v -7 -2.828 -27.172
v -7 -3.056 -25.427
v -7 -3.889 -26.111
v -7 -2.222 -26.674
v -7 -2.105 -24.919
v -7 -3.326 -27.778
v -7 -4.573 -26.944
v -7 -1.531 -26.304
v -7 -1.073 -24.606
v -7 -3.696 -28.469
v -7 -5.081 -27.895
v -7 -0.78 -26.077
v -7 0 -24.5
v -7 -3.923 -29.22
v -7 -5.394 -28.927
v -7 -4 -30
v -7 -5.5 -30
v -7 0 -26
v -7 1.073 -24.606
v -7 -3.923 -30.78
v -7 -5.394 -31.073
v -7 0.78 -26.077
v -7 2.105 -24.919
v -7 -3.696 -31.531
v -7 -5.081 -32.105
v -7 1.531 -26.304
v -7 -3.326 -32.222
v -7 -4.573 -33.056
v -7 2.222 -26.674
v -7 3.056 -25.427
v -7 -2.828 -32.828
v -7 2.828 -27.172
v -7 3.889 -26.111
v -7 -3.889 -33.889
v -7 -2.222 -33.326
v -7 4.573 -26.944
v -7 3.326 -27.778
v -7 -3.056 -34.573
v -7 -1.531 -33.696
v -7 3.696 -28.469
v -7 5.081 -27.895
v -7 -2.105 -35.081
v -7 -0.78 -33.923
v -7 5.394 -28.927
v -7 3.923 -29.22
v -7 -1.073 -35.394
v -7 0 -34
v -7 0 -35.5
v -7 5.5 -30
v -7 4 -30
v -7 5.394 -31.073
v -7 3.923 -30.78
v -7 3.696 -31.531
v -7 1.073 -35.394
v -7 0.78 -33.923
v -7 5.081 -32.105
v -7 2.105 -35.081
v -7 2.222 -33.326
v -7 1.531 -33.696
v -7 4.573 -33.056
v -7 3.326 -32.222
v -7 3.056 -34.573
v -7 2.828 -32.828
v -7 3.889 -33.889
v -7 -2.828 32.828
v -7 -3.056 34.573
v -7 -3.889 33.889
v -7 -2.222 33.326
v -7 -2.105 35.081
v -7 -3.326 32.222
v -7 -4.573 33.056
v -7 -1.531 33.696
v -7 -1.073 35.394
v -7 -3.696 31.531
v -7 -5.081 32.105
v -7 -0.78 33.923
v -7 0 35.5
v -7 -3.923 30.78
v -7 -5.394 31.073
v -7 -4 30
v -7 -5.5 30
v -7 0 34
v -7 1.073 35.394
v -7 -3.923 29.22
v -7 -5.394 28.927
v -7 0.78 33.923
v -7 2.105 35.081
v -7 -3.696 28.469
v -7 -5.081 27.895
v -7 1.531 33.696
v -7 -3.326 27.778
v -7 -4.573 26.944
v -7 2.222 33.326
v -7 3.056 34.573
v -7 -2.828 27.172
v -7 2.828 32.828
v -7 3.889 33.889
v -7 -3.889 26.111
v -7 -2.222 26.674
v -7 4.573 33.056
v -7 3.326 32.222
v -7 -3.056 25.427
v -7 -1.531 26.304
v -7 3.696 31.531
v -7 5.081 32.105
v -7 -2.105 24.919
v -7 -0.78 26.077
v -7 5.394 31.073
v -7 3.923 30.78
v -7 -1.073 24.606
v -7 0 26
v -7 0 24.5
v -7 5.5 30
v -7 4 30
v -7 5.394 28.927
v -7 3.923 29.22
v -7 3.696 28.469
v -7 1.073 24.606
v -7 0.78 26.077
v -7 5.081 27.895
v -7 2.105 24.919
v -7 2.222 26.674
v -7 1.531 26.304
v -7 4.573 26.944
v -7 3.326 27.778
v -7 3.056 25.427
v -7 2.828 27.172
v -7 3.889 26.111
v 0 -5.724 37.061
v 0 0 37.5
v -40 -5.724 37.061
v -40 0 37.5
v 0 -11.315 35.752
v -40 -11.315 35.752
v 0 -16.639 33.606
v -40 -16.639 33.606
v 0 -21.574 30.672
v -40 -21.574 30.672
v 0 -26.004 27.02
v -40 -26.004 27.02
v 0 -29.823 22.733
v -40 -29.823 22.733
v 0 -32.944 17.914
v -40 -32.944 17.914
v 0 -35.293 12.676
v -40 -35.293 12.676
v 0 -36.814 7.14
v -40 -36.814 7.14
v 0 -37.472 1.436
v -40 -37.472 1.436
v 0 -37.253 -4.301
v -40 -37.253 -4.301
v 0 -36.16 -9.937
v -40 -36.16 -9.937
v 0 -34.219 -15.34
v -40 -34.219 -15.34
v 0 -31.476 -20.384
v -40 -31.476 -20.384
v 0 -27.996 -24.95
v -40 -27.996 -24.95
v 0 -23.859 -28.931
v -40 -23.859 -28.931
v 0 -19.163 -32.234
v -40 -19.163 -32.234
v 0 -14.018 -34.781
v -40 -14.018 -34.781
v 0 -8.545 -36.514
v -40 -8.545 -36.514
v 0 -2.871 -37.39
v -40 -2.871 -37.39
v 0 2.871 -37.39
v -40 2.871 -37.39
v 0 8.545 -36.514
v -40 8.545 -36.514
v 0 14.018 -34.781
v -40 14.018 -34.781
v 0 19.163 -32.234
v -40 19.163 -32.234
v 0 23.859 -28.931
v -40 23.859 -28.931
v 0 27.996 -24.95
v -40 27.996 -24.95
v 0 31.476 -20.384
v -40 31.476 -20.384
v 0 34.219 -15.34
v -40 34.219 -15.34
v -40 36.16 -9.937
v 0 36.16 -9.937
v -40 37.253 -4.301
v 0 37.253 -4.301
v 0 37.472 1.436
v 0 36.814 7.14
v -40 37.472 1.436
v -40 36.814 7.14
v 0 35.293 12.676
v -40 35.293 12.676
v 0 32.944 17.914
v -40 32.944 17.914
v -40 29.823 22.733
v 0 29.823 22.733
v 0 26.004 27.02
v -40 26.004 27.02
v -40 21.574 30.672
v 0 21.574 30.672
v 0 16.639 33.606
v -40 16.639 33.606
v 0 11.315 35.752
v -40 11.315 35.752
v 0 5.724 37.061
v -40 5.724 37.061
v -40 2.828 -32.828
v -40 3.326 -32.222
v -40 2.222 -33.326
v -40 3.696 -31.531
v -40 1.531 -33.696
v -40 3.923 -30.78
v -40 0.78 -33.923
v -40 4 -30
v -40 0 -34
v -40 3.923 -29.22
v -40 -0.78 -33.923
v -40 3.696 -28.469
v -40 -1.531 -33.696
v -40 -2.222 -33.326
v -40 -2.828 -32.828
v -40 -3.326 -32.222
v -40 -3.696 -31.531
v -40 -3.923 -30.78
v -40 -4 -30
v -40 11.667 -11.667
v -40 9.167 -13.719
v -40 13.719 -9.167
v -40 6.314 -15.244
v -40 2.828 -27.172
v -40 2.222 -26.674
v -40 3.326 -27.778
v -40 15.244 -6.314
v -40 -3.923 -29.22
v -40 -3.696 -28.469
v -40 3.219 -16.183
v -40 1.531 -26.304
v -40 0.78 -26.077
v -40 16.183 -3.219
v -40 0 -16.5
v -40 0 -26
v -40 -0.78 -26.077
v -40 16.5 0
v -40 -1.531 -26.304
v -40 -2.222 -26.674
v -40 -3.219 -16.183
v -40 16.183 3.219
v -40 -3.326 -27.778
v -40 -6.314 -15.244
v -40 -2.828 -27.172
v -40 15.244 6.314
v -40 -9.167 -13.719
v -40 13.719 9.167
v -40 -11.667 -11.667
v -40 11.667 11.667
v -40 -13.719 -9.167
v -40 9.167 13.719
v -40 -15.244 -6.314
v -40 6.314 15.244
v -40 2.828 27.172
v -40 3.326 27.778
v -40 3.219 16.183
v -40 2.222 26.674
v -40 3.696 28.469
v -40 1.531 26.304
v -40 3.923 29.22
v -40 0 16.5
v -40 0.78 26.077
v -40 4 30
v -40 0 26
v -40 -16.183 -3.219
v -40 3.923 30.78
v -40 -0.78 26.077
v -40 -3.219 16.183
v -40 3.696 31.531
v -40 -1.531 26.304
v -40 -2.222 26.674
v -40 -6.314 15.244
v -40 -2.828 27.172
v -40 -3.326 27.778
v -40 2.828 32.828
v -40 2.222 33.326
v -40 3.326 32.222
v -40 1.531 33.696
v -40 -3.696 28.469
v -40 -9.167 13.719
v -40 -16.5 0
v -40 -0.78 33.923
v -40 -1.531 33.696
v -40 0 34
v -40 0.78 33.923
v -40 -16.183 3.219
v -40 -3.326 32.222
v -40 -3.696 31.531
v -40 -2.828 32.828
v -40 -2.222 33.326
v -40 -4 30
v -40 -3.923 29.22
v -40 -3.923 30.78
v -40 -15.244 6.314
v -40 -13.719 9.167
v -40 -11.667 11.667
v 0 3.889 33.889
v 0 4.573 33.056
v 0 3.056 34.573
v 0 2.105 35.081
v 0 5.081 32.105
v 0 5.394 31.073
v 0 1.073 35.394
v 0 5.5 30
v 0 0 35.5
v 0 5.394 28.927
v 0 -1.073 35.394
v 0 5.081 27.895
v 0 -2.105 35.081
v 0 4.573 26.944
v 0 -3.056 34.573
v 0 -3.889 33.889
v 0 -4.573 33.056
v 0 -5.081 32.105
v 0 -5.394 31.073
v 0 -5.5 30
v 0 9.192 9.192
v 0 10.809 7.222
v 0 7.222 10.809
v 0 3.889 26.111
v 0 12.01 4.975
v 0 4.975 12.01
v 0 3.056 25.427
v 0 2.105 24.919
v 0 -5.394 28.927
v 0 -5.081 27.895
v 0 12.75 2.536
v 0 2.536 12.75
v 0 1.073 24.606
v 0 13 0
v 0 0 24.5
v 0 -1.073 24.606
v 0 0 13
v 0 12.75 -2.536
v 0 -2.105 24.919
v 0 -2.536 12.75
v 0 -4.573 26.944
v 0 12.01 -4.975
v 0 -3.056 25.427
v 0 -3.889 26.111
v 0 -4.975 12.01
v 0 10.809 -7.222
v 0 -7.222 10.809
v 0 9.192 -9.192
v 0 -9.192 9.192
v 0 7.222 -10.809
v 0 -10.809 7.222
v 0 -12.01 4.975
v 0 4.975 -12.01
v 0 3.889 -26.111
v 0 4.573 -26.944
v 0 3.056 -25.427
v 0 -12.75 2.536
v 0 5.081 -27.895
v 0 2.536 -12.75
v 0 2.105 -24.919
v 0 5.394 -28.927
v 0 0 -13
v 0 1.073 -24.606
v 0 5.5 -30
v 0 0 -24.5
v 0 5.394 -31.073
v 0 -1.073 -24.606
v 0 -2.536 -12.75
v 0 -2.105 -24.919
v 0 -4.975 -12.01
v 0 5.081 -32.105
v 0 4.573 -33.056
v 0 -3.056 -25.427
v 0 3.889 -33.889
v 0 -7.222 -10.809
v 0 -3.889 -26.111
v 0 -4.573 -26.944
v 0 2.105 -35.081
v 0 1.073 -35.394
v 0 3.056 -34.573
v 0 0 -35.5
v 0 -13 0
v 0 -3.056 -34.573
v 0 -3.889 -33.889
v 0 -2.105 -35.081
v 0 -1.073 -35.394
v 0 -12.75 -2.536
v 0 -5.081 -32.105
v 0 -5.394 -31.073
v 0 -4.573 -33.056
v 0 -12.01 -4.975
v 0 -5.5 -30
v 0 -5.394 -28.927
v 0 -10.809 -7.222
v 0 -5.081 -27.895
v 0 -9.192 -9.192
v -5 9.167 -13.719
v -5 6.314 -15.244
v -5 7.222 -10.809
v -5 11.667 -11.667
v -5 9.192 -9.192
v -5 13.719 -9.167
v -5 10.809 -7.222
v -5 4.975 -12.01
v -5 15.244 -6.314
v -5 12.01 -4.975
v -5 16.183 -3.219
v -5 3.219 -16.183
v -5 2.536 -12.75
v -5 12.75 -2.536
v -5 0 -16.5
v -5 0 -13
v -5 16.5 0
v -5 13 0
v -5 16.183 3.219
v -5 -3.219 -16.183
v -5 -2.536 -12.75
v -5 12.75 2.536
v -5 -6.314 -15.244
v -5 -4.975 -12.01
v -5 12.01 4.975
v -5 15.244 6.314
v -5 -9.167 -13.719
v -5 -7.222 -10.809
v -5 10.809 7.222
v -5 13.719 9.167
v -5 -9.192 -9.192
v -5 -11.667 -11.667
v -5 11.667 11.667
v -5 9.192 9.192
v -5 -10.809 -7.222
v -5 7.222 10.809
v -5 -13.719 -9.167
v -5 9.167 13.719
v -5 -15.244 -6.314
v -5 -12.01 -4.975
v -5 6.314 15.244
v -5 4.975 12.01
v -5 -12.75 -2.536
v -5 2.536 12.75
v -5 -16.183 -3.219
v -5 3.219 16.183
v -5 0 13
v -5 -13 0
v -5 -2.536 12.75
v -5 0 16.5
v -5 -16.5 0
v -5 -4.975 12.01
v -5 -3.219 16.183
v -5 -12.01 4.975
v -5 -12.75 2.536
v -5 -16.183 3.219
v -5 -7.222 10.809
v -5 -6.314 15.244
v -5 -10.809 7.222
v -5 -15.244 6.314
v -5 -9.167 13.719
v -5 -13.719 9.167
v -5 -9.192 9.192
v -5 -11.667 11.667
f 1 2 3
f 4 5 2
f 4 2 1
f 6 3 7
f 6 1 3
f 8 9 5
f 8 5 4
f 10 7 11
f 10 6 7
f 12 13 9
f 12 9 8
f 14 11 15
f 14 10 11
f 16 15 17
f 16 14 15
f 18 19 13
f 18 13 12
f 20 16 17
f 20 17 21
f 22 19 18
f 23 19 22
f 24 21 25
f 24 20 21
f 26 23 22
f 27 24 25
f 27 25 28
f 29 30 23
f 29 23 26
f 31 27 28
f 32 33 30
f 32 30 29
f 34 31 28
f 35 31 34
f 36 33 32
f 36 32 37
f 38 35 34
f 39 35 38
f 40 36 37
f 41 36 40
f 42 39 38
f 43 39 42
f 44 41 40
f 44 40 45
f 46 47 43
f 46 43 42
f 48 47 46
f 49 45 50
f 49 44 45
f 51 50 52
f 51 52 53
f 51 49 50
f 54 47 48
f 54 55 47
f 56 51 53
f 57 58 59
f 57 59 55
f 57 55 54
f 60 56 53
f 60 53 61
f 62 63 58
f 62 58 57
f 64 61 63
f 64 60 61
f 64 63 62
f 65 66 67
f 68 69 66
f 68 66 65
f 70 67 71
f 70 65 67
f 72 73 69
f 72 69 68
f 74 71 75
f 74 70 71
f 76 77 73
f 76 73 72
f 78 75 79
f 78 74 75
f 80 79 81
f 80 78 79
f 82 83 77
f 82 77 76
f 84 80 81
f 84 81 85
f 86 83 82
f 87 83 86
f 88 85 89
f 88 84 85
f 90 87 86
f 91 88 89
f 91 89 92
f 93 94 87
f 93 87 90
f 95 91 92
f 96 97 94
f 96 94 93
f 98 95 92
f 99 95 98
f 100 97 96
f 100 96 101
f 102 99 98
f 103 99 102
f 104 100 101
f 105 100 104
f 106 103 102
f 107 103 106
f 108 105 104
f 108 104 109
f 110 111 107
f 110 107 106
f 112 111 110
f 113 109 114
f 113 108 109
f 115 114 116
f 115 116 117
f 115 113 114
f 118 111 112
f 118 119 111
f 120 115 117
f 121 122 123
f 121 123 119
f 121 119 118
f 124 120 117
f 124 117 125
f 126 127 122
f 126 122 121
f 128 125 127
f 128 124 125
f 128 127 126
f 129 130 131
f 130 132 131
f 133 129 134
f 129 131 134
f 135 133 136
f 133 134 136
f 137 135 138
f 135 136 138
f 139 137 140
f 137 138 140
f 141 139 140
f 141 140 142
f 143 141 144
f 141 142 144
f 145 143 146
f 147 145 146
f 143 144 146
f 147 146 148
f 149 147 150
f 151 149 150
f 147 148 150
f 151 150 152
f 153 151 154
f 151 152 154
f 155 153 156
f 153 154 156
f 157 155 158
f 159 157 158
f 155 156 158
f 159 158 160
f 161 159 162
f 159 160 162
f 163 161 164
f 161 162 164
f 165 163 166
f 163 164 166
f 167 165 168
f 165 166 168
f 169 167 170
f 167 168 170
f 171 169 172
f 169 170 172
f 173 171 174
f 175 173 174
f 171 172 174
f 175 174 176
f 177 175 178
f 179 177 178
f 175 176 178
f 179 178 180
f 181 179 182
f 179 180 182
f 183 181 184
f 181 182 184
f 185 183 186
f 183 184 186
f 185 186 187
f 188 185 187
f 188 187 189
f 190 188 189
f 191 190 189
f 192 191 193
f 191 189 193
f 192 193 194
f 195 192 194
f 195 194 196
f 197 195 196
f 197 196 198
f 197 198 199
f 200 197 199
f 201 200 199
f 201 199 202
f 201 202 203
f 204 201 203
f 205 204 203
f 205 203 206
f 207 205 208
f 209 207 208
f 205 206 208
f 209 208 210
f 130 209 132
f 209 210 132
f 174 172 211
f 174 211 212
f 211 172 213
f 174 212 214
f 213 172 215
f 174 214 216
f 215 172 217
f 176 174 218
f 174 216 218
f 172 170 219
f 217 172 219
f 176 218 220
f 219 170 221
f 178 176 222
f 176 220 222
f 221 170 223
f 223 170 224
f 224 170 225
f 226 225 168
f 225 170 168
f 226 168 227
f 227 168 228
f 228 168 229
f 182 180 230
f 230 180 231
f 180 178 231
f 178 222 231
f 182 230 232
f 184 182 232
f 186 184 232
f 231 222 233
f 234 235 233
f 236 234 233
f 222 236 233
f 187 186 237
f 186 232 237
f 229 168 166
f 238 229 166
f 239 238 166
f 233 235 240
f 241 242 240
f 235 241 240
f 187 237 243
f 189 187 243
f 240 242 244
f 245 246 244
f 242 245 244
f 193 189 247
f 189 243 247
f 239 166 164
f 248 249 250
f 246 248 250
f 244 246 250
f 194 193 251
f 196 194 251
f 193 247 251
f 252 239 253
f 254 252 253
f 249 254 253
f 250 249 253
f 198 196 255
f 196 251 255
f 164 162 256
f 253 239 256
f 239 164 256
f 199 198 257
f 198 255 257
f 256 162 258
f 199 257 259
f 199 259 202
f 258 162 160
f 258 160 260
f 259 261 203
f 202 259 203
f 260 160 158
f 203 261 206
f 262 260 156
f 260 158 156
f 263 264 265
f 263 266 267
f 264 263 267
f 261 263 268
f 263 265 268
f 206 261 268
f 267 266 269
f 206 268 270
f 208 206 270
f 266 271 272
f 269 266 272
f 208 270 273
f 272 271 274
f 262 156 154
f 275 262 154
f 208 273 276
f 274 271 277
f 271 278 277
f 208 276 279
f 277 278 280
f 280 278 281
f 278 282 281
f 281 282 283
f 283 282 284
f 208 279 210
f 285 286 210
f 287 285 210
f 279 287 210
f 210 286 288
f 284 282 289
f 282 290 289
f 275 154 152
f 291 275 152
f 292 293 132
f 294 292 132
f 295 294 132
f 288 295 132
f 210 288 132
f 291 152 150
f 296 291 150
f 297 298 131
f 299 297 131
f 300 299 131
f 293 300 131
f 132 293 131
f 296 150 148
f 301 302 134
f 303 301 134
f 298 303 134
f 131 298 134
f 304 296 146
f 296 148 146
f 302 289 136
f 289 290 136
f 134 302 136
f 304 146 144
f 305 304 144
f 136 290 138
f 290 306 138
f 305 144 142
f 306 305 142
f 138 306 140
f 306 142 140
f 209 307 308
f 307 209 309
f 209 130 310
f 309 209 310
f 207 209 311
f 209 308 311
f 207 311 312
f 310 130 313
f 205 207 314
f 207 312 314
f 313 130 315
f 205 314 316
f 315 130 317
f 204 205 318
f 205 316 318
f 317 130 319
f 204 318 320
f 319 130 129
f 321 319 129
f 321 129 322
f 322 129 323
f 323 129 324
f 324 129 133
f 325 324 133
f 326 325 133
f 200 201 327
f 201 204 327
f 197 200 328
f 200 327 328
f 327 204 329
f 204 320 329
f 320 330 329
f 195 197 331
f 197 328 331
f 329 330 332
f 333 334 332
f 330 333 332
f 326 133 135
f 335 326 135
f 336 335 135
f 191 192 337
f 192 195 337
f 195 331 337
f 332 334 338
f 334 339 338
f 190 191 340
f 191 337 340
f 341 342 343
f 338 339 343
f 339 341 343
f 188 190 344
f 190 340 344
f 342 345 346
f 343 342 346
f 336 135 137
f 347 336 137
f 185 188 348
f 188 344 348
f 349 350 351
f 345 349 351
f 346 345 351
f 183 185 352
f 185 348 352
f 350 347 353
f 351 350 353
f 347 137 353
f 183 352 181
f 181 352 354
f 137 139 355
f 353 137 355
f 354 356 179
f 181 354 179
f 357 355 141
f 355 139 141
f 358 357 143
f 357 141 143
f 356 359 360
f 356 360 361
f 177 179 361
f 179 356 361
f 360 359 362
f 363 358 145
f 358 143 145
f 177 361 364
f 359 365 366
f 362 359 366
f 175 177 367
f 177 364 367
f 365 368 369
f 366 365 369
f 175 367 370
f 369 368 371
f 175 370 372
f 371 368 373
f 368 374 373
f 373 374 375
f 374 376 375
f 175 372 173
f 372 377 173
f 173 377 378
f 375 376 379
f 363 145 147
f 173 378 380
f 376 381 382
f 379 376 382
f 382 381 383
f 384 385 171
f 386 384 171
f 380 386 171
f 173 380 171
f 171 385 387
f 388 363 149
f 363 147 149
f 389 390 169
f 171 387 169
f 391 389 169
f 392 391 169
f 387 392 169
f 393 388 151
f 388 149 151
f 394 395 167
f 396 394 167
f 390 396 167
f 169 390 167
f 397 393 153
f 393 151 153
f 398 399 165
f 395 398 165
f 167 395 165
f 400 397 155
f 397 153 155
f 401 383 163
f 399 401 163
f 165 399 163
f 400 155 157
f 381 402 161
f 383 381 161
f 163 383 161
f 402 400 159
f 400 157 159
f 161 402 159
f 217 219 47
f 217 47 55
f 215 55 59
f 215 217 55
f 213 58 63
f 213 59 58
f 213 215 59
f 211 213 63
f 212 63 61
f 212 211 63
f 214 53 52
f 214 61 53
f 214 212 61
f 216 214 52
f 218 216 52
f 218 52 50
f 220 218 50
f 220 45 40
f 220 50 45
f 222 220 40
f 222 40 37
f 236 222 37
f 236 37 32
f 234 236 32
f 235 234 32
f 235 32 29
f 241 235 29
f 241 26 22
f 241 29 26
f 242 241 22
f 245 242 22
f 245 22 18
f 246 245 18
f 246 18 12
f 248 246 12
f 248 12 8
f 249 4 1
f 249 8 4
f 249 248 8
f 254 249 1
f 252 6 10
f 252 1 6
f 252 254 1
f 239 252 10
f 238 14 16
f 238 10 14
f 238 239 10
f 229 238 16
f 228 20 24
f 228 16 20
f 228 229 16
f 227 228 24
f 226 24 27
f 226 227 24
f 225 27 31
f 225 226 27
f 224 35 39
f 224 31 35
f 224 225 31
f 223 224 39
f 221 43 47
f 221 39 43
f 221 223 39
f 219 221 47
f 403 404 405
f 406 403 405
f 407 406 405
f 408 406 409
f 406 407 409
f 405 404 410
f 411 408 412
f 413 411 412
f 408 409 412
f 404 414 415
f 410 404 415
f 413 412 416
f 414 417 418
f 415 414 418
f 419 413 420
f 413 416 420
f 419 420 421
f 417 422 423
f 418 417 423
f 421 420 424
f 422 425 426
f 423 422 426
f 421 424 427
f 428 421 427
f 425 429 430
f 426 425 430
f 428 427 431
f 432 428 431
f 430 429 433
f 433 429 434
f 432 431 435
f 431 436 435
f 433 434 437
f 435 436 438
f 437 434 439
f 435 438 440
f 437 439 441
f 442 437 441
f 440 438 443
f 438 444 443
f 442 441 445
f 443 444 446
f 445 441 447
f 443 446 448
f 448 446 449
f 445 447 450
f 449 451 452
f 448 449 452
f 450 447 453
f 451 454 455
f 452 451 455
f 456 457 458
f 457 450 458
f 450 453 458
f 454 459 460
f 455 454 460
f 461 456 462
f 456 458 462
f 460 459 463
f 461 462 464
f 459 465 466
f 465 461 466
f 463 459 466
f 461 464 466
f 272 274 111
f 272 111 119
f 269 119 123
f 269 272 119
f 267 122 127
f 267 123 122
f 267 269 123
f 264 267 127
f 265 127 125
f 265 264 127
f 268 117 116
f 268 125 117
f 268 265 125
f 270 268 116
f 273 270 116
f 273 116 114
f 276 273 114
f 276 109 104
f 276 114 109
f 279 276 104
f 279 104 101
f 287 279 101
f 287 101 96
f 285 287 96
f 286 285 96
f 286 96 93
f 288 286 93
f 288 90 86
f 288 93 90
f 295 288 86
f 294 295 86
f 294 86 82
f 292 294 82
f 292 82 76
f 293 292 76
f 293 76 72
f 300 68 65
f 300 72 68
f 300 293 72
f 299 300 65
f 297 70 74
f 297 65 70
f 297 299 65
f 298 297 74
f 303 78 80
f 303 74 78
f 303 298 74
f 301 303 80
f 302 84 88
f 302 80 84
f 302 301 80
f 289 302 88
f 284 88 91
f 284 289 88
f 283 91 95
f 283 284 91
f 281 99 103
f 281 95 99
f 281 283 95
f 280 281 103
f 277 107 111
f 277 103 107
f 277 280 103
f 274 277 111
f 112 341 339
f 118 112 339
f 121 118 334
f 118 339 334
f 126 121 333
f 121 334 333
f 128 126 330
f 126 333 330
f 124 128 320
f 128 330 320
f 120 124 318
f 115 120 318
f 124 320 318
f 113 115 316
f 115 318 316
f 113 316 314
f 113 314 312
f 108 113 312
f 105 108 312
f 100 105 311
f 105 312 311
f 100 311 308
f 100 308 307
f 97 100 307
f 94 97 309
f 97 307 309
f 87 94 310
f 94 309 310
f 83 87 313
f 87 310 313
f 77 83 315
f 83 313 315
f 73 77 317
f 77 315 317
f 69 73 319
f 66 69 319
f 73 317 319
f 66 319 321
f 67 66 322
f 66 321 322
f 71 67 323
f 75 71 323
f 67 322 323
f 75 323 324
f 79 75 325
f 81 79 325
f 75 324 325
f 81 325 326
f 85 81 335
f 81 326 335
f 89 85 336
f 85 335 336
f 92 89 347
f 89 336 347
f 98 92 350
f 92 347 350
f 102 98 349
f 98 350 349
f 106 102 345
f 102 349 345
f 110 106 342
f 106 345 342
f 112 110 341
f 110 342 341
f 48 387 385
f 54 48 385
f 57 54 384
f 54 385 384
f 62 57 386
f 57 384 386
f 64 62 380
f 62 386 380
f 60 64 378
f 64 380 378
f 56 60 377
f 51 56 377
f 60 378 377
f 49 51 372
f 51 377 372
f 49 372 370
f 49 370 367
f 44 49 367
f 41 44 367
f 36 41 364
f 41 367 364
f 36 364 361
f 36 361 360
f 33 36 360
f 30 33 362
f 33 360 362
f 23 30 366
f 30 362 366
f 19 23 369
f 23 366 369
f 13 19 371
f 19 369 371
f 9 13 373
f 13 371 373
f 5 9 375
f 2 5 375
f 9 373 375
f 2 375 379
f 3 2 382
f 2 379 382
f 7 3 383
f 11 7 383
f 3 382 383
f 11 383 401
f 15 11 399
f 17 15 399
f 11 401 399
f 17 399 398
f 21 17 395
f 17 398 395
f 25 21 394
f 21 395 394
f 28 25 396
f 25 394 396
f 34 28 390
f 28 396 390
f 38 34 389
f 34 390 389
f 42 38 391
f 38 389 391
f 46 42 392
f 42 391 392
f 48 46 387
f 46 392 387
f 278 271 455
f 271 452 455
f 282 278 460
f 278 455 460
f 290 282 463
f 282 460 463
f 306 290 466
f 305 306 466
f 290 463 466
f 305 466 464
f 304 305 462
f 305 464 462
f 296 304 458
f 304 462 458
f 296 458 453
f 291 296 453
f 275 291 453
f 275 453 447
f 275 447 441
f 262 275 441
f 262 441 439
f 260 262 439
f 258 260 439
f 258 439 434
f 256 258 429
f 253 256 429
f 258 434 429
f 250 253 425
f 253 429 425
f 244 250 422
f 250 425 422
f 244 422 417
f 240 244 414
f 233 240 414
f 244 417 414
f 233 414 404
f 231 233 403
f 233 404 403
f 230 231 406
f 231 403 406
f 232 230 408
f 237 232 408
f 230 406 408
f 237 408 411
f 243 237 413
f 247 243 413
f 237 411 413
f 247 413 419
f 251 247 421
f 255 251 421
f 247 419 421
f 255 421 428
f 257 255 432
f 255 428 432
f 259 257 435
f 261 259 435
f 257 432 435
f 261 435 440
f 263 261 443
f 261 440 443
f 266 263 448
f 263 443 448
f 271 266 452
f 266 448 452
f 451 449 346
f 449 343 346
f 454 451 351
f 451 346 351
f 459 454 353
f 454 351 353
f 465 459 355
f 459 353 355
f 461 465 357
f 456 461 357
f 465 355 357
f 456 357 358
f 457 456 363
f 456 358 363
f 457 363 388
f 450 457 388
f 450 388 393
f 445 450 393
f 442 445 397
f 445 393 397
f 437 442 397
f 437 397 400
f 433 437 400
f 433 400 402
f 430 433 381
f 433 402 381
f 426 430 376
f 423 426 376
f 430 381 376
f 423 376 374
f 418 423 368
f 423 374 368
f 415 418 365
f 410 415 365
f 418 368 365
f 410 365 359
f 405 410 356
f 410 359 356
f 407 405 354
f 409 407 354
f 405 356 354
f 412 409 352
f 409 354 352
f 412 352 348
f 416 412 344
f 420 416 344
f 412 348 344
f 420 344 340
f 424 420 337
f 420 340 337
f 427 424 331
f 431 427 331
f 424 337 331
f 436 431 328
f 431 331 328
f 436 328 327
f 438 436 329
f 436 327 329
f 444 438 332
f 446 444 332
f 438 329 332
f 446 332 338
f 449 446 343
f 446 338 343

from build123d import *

# Parameters (mm, degrees)
CUT_EXTRUDE_1_DEPTH      = 67.426651278
CUT_EXTRUDE_1_DEPTH_BACK = 67.426651278
SKETCH_2_R               = 4
SKETCH_3_R               = 5.5
CUT_EXTRUDE_2_DEPTH      = 7


with BuildPart() as part:
    # ｽｹｯﾁ1 → 回転1 (revolve)
    with BuildSketch(Plane.XY, mode=Mode.PRIVATE) as revolve_1_sk:
        Polygon((-40, 16.5), (-5, 16.5), (-5, 13), (0, 13), (0, 37.5), (-40, 37.5), align=None)
    revolve(revolve_1_sk.sketch.rotate(Axis((-40, 0, 0), (1, 0, 0)), 90), axis=Axis((-40, 0, 0), (1, 0, 0)))

    # ｽｹｯﾁ2 → ｶｯﾄ - 押し出し1 (cut, two sides: drawn at the far end of the back side and taken through both)
    with BuildSketch(Plane(origin=(0, 0, 0), x_dir=(0, 0, -1), z_dir=(1, 0, 0)).offset(-CUT_EXTRUDE_1_DEPTH_BACK)):
        with Locations((30, 0)):
            Circle(SKETCH_2_R)
        with Locations((-30, 0)):
            Circle(SKETCH_2_R)
    extrude(amount=CUT_EXTRUDE_1_DEPTH + CUT_EXTRUDE_1_DEPTH_BACK, mode=Mode.SUBTRACT)

    # ｽｹｯﾁ3 → ｶｯﾄ - 押し出し2 (cut)
    with BuildSketch(Plane(origin=(0, 0, 0), x_dir=(0, 0, -1), z_dir=(1, 0, 0))):
        with Locations((30, 0)):
            Circle(SKETCH_3_R)
        with Locations((-30, 0)):
            Circle(SKETCH_3_R)
    extrude(amount=-CUT_EXTRUDE_2_DEPTH, mode=Mode.SUBTRACT)


solid = part.part
